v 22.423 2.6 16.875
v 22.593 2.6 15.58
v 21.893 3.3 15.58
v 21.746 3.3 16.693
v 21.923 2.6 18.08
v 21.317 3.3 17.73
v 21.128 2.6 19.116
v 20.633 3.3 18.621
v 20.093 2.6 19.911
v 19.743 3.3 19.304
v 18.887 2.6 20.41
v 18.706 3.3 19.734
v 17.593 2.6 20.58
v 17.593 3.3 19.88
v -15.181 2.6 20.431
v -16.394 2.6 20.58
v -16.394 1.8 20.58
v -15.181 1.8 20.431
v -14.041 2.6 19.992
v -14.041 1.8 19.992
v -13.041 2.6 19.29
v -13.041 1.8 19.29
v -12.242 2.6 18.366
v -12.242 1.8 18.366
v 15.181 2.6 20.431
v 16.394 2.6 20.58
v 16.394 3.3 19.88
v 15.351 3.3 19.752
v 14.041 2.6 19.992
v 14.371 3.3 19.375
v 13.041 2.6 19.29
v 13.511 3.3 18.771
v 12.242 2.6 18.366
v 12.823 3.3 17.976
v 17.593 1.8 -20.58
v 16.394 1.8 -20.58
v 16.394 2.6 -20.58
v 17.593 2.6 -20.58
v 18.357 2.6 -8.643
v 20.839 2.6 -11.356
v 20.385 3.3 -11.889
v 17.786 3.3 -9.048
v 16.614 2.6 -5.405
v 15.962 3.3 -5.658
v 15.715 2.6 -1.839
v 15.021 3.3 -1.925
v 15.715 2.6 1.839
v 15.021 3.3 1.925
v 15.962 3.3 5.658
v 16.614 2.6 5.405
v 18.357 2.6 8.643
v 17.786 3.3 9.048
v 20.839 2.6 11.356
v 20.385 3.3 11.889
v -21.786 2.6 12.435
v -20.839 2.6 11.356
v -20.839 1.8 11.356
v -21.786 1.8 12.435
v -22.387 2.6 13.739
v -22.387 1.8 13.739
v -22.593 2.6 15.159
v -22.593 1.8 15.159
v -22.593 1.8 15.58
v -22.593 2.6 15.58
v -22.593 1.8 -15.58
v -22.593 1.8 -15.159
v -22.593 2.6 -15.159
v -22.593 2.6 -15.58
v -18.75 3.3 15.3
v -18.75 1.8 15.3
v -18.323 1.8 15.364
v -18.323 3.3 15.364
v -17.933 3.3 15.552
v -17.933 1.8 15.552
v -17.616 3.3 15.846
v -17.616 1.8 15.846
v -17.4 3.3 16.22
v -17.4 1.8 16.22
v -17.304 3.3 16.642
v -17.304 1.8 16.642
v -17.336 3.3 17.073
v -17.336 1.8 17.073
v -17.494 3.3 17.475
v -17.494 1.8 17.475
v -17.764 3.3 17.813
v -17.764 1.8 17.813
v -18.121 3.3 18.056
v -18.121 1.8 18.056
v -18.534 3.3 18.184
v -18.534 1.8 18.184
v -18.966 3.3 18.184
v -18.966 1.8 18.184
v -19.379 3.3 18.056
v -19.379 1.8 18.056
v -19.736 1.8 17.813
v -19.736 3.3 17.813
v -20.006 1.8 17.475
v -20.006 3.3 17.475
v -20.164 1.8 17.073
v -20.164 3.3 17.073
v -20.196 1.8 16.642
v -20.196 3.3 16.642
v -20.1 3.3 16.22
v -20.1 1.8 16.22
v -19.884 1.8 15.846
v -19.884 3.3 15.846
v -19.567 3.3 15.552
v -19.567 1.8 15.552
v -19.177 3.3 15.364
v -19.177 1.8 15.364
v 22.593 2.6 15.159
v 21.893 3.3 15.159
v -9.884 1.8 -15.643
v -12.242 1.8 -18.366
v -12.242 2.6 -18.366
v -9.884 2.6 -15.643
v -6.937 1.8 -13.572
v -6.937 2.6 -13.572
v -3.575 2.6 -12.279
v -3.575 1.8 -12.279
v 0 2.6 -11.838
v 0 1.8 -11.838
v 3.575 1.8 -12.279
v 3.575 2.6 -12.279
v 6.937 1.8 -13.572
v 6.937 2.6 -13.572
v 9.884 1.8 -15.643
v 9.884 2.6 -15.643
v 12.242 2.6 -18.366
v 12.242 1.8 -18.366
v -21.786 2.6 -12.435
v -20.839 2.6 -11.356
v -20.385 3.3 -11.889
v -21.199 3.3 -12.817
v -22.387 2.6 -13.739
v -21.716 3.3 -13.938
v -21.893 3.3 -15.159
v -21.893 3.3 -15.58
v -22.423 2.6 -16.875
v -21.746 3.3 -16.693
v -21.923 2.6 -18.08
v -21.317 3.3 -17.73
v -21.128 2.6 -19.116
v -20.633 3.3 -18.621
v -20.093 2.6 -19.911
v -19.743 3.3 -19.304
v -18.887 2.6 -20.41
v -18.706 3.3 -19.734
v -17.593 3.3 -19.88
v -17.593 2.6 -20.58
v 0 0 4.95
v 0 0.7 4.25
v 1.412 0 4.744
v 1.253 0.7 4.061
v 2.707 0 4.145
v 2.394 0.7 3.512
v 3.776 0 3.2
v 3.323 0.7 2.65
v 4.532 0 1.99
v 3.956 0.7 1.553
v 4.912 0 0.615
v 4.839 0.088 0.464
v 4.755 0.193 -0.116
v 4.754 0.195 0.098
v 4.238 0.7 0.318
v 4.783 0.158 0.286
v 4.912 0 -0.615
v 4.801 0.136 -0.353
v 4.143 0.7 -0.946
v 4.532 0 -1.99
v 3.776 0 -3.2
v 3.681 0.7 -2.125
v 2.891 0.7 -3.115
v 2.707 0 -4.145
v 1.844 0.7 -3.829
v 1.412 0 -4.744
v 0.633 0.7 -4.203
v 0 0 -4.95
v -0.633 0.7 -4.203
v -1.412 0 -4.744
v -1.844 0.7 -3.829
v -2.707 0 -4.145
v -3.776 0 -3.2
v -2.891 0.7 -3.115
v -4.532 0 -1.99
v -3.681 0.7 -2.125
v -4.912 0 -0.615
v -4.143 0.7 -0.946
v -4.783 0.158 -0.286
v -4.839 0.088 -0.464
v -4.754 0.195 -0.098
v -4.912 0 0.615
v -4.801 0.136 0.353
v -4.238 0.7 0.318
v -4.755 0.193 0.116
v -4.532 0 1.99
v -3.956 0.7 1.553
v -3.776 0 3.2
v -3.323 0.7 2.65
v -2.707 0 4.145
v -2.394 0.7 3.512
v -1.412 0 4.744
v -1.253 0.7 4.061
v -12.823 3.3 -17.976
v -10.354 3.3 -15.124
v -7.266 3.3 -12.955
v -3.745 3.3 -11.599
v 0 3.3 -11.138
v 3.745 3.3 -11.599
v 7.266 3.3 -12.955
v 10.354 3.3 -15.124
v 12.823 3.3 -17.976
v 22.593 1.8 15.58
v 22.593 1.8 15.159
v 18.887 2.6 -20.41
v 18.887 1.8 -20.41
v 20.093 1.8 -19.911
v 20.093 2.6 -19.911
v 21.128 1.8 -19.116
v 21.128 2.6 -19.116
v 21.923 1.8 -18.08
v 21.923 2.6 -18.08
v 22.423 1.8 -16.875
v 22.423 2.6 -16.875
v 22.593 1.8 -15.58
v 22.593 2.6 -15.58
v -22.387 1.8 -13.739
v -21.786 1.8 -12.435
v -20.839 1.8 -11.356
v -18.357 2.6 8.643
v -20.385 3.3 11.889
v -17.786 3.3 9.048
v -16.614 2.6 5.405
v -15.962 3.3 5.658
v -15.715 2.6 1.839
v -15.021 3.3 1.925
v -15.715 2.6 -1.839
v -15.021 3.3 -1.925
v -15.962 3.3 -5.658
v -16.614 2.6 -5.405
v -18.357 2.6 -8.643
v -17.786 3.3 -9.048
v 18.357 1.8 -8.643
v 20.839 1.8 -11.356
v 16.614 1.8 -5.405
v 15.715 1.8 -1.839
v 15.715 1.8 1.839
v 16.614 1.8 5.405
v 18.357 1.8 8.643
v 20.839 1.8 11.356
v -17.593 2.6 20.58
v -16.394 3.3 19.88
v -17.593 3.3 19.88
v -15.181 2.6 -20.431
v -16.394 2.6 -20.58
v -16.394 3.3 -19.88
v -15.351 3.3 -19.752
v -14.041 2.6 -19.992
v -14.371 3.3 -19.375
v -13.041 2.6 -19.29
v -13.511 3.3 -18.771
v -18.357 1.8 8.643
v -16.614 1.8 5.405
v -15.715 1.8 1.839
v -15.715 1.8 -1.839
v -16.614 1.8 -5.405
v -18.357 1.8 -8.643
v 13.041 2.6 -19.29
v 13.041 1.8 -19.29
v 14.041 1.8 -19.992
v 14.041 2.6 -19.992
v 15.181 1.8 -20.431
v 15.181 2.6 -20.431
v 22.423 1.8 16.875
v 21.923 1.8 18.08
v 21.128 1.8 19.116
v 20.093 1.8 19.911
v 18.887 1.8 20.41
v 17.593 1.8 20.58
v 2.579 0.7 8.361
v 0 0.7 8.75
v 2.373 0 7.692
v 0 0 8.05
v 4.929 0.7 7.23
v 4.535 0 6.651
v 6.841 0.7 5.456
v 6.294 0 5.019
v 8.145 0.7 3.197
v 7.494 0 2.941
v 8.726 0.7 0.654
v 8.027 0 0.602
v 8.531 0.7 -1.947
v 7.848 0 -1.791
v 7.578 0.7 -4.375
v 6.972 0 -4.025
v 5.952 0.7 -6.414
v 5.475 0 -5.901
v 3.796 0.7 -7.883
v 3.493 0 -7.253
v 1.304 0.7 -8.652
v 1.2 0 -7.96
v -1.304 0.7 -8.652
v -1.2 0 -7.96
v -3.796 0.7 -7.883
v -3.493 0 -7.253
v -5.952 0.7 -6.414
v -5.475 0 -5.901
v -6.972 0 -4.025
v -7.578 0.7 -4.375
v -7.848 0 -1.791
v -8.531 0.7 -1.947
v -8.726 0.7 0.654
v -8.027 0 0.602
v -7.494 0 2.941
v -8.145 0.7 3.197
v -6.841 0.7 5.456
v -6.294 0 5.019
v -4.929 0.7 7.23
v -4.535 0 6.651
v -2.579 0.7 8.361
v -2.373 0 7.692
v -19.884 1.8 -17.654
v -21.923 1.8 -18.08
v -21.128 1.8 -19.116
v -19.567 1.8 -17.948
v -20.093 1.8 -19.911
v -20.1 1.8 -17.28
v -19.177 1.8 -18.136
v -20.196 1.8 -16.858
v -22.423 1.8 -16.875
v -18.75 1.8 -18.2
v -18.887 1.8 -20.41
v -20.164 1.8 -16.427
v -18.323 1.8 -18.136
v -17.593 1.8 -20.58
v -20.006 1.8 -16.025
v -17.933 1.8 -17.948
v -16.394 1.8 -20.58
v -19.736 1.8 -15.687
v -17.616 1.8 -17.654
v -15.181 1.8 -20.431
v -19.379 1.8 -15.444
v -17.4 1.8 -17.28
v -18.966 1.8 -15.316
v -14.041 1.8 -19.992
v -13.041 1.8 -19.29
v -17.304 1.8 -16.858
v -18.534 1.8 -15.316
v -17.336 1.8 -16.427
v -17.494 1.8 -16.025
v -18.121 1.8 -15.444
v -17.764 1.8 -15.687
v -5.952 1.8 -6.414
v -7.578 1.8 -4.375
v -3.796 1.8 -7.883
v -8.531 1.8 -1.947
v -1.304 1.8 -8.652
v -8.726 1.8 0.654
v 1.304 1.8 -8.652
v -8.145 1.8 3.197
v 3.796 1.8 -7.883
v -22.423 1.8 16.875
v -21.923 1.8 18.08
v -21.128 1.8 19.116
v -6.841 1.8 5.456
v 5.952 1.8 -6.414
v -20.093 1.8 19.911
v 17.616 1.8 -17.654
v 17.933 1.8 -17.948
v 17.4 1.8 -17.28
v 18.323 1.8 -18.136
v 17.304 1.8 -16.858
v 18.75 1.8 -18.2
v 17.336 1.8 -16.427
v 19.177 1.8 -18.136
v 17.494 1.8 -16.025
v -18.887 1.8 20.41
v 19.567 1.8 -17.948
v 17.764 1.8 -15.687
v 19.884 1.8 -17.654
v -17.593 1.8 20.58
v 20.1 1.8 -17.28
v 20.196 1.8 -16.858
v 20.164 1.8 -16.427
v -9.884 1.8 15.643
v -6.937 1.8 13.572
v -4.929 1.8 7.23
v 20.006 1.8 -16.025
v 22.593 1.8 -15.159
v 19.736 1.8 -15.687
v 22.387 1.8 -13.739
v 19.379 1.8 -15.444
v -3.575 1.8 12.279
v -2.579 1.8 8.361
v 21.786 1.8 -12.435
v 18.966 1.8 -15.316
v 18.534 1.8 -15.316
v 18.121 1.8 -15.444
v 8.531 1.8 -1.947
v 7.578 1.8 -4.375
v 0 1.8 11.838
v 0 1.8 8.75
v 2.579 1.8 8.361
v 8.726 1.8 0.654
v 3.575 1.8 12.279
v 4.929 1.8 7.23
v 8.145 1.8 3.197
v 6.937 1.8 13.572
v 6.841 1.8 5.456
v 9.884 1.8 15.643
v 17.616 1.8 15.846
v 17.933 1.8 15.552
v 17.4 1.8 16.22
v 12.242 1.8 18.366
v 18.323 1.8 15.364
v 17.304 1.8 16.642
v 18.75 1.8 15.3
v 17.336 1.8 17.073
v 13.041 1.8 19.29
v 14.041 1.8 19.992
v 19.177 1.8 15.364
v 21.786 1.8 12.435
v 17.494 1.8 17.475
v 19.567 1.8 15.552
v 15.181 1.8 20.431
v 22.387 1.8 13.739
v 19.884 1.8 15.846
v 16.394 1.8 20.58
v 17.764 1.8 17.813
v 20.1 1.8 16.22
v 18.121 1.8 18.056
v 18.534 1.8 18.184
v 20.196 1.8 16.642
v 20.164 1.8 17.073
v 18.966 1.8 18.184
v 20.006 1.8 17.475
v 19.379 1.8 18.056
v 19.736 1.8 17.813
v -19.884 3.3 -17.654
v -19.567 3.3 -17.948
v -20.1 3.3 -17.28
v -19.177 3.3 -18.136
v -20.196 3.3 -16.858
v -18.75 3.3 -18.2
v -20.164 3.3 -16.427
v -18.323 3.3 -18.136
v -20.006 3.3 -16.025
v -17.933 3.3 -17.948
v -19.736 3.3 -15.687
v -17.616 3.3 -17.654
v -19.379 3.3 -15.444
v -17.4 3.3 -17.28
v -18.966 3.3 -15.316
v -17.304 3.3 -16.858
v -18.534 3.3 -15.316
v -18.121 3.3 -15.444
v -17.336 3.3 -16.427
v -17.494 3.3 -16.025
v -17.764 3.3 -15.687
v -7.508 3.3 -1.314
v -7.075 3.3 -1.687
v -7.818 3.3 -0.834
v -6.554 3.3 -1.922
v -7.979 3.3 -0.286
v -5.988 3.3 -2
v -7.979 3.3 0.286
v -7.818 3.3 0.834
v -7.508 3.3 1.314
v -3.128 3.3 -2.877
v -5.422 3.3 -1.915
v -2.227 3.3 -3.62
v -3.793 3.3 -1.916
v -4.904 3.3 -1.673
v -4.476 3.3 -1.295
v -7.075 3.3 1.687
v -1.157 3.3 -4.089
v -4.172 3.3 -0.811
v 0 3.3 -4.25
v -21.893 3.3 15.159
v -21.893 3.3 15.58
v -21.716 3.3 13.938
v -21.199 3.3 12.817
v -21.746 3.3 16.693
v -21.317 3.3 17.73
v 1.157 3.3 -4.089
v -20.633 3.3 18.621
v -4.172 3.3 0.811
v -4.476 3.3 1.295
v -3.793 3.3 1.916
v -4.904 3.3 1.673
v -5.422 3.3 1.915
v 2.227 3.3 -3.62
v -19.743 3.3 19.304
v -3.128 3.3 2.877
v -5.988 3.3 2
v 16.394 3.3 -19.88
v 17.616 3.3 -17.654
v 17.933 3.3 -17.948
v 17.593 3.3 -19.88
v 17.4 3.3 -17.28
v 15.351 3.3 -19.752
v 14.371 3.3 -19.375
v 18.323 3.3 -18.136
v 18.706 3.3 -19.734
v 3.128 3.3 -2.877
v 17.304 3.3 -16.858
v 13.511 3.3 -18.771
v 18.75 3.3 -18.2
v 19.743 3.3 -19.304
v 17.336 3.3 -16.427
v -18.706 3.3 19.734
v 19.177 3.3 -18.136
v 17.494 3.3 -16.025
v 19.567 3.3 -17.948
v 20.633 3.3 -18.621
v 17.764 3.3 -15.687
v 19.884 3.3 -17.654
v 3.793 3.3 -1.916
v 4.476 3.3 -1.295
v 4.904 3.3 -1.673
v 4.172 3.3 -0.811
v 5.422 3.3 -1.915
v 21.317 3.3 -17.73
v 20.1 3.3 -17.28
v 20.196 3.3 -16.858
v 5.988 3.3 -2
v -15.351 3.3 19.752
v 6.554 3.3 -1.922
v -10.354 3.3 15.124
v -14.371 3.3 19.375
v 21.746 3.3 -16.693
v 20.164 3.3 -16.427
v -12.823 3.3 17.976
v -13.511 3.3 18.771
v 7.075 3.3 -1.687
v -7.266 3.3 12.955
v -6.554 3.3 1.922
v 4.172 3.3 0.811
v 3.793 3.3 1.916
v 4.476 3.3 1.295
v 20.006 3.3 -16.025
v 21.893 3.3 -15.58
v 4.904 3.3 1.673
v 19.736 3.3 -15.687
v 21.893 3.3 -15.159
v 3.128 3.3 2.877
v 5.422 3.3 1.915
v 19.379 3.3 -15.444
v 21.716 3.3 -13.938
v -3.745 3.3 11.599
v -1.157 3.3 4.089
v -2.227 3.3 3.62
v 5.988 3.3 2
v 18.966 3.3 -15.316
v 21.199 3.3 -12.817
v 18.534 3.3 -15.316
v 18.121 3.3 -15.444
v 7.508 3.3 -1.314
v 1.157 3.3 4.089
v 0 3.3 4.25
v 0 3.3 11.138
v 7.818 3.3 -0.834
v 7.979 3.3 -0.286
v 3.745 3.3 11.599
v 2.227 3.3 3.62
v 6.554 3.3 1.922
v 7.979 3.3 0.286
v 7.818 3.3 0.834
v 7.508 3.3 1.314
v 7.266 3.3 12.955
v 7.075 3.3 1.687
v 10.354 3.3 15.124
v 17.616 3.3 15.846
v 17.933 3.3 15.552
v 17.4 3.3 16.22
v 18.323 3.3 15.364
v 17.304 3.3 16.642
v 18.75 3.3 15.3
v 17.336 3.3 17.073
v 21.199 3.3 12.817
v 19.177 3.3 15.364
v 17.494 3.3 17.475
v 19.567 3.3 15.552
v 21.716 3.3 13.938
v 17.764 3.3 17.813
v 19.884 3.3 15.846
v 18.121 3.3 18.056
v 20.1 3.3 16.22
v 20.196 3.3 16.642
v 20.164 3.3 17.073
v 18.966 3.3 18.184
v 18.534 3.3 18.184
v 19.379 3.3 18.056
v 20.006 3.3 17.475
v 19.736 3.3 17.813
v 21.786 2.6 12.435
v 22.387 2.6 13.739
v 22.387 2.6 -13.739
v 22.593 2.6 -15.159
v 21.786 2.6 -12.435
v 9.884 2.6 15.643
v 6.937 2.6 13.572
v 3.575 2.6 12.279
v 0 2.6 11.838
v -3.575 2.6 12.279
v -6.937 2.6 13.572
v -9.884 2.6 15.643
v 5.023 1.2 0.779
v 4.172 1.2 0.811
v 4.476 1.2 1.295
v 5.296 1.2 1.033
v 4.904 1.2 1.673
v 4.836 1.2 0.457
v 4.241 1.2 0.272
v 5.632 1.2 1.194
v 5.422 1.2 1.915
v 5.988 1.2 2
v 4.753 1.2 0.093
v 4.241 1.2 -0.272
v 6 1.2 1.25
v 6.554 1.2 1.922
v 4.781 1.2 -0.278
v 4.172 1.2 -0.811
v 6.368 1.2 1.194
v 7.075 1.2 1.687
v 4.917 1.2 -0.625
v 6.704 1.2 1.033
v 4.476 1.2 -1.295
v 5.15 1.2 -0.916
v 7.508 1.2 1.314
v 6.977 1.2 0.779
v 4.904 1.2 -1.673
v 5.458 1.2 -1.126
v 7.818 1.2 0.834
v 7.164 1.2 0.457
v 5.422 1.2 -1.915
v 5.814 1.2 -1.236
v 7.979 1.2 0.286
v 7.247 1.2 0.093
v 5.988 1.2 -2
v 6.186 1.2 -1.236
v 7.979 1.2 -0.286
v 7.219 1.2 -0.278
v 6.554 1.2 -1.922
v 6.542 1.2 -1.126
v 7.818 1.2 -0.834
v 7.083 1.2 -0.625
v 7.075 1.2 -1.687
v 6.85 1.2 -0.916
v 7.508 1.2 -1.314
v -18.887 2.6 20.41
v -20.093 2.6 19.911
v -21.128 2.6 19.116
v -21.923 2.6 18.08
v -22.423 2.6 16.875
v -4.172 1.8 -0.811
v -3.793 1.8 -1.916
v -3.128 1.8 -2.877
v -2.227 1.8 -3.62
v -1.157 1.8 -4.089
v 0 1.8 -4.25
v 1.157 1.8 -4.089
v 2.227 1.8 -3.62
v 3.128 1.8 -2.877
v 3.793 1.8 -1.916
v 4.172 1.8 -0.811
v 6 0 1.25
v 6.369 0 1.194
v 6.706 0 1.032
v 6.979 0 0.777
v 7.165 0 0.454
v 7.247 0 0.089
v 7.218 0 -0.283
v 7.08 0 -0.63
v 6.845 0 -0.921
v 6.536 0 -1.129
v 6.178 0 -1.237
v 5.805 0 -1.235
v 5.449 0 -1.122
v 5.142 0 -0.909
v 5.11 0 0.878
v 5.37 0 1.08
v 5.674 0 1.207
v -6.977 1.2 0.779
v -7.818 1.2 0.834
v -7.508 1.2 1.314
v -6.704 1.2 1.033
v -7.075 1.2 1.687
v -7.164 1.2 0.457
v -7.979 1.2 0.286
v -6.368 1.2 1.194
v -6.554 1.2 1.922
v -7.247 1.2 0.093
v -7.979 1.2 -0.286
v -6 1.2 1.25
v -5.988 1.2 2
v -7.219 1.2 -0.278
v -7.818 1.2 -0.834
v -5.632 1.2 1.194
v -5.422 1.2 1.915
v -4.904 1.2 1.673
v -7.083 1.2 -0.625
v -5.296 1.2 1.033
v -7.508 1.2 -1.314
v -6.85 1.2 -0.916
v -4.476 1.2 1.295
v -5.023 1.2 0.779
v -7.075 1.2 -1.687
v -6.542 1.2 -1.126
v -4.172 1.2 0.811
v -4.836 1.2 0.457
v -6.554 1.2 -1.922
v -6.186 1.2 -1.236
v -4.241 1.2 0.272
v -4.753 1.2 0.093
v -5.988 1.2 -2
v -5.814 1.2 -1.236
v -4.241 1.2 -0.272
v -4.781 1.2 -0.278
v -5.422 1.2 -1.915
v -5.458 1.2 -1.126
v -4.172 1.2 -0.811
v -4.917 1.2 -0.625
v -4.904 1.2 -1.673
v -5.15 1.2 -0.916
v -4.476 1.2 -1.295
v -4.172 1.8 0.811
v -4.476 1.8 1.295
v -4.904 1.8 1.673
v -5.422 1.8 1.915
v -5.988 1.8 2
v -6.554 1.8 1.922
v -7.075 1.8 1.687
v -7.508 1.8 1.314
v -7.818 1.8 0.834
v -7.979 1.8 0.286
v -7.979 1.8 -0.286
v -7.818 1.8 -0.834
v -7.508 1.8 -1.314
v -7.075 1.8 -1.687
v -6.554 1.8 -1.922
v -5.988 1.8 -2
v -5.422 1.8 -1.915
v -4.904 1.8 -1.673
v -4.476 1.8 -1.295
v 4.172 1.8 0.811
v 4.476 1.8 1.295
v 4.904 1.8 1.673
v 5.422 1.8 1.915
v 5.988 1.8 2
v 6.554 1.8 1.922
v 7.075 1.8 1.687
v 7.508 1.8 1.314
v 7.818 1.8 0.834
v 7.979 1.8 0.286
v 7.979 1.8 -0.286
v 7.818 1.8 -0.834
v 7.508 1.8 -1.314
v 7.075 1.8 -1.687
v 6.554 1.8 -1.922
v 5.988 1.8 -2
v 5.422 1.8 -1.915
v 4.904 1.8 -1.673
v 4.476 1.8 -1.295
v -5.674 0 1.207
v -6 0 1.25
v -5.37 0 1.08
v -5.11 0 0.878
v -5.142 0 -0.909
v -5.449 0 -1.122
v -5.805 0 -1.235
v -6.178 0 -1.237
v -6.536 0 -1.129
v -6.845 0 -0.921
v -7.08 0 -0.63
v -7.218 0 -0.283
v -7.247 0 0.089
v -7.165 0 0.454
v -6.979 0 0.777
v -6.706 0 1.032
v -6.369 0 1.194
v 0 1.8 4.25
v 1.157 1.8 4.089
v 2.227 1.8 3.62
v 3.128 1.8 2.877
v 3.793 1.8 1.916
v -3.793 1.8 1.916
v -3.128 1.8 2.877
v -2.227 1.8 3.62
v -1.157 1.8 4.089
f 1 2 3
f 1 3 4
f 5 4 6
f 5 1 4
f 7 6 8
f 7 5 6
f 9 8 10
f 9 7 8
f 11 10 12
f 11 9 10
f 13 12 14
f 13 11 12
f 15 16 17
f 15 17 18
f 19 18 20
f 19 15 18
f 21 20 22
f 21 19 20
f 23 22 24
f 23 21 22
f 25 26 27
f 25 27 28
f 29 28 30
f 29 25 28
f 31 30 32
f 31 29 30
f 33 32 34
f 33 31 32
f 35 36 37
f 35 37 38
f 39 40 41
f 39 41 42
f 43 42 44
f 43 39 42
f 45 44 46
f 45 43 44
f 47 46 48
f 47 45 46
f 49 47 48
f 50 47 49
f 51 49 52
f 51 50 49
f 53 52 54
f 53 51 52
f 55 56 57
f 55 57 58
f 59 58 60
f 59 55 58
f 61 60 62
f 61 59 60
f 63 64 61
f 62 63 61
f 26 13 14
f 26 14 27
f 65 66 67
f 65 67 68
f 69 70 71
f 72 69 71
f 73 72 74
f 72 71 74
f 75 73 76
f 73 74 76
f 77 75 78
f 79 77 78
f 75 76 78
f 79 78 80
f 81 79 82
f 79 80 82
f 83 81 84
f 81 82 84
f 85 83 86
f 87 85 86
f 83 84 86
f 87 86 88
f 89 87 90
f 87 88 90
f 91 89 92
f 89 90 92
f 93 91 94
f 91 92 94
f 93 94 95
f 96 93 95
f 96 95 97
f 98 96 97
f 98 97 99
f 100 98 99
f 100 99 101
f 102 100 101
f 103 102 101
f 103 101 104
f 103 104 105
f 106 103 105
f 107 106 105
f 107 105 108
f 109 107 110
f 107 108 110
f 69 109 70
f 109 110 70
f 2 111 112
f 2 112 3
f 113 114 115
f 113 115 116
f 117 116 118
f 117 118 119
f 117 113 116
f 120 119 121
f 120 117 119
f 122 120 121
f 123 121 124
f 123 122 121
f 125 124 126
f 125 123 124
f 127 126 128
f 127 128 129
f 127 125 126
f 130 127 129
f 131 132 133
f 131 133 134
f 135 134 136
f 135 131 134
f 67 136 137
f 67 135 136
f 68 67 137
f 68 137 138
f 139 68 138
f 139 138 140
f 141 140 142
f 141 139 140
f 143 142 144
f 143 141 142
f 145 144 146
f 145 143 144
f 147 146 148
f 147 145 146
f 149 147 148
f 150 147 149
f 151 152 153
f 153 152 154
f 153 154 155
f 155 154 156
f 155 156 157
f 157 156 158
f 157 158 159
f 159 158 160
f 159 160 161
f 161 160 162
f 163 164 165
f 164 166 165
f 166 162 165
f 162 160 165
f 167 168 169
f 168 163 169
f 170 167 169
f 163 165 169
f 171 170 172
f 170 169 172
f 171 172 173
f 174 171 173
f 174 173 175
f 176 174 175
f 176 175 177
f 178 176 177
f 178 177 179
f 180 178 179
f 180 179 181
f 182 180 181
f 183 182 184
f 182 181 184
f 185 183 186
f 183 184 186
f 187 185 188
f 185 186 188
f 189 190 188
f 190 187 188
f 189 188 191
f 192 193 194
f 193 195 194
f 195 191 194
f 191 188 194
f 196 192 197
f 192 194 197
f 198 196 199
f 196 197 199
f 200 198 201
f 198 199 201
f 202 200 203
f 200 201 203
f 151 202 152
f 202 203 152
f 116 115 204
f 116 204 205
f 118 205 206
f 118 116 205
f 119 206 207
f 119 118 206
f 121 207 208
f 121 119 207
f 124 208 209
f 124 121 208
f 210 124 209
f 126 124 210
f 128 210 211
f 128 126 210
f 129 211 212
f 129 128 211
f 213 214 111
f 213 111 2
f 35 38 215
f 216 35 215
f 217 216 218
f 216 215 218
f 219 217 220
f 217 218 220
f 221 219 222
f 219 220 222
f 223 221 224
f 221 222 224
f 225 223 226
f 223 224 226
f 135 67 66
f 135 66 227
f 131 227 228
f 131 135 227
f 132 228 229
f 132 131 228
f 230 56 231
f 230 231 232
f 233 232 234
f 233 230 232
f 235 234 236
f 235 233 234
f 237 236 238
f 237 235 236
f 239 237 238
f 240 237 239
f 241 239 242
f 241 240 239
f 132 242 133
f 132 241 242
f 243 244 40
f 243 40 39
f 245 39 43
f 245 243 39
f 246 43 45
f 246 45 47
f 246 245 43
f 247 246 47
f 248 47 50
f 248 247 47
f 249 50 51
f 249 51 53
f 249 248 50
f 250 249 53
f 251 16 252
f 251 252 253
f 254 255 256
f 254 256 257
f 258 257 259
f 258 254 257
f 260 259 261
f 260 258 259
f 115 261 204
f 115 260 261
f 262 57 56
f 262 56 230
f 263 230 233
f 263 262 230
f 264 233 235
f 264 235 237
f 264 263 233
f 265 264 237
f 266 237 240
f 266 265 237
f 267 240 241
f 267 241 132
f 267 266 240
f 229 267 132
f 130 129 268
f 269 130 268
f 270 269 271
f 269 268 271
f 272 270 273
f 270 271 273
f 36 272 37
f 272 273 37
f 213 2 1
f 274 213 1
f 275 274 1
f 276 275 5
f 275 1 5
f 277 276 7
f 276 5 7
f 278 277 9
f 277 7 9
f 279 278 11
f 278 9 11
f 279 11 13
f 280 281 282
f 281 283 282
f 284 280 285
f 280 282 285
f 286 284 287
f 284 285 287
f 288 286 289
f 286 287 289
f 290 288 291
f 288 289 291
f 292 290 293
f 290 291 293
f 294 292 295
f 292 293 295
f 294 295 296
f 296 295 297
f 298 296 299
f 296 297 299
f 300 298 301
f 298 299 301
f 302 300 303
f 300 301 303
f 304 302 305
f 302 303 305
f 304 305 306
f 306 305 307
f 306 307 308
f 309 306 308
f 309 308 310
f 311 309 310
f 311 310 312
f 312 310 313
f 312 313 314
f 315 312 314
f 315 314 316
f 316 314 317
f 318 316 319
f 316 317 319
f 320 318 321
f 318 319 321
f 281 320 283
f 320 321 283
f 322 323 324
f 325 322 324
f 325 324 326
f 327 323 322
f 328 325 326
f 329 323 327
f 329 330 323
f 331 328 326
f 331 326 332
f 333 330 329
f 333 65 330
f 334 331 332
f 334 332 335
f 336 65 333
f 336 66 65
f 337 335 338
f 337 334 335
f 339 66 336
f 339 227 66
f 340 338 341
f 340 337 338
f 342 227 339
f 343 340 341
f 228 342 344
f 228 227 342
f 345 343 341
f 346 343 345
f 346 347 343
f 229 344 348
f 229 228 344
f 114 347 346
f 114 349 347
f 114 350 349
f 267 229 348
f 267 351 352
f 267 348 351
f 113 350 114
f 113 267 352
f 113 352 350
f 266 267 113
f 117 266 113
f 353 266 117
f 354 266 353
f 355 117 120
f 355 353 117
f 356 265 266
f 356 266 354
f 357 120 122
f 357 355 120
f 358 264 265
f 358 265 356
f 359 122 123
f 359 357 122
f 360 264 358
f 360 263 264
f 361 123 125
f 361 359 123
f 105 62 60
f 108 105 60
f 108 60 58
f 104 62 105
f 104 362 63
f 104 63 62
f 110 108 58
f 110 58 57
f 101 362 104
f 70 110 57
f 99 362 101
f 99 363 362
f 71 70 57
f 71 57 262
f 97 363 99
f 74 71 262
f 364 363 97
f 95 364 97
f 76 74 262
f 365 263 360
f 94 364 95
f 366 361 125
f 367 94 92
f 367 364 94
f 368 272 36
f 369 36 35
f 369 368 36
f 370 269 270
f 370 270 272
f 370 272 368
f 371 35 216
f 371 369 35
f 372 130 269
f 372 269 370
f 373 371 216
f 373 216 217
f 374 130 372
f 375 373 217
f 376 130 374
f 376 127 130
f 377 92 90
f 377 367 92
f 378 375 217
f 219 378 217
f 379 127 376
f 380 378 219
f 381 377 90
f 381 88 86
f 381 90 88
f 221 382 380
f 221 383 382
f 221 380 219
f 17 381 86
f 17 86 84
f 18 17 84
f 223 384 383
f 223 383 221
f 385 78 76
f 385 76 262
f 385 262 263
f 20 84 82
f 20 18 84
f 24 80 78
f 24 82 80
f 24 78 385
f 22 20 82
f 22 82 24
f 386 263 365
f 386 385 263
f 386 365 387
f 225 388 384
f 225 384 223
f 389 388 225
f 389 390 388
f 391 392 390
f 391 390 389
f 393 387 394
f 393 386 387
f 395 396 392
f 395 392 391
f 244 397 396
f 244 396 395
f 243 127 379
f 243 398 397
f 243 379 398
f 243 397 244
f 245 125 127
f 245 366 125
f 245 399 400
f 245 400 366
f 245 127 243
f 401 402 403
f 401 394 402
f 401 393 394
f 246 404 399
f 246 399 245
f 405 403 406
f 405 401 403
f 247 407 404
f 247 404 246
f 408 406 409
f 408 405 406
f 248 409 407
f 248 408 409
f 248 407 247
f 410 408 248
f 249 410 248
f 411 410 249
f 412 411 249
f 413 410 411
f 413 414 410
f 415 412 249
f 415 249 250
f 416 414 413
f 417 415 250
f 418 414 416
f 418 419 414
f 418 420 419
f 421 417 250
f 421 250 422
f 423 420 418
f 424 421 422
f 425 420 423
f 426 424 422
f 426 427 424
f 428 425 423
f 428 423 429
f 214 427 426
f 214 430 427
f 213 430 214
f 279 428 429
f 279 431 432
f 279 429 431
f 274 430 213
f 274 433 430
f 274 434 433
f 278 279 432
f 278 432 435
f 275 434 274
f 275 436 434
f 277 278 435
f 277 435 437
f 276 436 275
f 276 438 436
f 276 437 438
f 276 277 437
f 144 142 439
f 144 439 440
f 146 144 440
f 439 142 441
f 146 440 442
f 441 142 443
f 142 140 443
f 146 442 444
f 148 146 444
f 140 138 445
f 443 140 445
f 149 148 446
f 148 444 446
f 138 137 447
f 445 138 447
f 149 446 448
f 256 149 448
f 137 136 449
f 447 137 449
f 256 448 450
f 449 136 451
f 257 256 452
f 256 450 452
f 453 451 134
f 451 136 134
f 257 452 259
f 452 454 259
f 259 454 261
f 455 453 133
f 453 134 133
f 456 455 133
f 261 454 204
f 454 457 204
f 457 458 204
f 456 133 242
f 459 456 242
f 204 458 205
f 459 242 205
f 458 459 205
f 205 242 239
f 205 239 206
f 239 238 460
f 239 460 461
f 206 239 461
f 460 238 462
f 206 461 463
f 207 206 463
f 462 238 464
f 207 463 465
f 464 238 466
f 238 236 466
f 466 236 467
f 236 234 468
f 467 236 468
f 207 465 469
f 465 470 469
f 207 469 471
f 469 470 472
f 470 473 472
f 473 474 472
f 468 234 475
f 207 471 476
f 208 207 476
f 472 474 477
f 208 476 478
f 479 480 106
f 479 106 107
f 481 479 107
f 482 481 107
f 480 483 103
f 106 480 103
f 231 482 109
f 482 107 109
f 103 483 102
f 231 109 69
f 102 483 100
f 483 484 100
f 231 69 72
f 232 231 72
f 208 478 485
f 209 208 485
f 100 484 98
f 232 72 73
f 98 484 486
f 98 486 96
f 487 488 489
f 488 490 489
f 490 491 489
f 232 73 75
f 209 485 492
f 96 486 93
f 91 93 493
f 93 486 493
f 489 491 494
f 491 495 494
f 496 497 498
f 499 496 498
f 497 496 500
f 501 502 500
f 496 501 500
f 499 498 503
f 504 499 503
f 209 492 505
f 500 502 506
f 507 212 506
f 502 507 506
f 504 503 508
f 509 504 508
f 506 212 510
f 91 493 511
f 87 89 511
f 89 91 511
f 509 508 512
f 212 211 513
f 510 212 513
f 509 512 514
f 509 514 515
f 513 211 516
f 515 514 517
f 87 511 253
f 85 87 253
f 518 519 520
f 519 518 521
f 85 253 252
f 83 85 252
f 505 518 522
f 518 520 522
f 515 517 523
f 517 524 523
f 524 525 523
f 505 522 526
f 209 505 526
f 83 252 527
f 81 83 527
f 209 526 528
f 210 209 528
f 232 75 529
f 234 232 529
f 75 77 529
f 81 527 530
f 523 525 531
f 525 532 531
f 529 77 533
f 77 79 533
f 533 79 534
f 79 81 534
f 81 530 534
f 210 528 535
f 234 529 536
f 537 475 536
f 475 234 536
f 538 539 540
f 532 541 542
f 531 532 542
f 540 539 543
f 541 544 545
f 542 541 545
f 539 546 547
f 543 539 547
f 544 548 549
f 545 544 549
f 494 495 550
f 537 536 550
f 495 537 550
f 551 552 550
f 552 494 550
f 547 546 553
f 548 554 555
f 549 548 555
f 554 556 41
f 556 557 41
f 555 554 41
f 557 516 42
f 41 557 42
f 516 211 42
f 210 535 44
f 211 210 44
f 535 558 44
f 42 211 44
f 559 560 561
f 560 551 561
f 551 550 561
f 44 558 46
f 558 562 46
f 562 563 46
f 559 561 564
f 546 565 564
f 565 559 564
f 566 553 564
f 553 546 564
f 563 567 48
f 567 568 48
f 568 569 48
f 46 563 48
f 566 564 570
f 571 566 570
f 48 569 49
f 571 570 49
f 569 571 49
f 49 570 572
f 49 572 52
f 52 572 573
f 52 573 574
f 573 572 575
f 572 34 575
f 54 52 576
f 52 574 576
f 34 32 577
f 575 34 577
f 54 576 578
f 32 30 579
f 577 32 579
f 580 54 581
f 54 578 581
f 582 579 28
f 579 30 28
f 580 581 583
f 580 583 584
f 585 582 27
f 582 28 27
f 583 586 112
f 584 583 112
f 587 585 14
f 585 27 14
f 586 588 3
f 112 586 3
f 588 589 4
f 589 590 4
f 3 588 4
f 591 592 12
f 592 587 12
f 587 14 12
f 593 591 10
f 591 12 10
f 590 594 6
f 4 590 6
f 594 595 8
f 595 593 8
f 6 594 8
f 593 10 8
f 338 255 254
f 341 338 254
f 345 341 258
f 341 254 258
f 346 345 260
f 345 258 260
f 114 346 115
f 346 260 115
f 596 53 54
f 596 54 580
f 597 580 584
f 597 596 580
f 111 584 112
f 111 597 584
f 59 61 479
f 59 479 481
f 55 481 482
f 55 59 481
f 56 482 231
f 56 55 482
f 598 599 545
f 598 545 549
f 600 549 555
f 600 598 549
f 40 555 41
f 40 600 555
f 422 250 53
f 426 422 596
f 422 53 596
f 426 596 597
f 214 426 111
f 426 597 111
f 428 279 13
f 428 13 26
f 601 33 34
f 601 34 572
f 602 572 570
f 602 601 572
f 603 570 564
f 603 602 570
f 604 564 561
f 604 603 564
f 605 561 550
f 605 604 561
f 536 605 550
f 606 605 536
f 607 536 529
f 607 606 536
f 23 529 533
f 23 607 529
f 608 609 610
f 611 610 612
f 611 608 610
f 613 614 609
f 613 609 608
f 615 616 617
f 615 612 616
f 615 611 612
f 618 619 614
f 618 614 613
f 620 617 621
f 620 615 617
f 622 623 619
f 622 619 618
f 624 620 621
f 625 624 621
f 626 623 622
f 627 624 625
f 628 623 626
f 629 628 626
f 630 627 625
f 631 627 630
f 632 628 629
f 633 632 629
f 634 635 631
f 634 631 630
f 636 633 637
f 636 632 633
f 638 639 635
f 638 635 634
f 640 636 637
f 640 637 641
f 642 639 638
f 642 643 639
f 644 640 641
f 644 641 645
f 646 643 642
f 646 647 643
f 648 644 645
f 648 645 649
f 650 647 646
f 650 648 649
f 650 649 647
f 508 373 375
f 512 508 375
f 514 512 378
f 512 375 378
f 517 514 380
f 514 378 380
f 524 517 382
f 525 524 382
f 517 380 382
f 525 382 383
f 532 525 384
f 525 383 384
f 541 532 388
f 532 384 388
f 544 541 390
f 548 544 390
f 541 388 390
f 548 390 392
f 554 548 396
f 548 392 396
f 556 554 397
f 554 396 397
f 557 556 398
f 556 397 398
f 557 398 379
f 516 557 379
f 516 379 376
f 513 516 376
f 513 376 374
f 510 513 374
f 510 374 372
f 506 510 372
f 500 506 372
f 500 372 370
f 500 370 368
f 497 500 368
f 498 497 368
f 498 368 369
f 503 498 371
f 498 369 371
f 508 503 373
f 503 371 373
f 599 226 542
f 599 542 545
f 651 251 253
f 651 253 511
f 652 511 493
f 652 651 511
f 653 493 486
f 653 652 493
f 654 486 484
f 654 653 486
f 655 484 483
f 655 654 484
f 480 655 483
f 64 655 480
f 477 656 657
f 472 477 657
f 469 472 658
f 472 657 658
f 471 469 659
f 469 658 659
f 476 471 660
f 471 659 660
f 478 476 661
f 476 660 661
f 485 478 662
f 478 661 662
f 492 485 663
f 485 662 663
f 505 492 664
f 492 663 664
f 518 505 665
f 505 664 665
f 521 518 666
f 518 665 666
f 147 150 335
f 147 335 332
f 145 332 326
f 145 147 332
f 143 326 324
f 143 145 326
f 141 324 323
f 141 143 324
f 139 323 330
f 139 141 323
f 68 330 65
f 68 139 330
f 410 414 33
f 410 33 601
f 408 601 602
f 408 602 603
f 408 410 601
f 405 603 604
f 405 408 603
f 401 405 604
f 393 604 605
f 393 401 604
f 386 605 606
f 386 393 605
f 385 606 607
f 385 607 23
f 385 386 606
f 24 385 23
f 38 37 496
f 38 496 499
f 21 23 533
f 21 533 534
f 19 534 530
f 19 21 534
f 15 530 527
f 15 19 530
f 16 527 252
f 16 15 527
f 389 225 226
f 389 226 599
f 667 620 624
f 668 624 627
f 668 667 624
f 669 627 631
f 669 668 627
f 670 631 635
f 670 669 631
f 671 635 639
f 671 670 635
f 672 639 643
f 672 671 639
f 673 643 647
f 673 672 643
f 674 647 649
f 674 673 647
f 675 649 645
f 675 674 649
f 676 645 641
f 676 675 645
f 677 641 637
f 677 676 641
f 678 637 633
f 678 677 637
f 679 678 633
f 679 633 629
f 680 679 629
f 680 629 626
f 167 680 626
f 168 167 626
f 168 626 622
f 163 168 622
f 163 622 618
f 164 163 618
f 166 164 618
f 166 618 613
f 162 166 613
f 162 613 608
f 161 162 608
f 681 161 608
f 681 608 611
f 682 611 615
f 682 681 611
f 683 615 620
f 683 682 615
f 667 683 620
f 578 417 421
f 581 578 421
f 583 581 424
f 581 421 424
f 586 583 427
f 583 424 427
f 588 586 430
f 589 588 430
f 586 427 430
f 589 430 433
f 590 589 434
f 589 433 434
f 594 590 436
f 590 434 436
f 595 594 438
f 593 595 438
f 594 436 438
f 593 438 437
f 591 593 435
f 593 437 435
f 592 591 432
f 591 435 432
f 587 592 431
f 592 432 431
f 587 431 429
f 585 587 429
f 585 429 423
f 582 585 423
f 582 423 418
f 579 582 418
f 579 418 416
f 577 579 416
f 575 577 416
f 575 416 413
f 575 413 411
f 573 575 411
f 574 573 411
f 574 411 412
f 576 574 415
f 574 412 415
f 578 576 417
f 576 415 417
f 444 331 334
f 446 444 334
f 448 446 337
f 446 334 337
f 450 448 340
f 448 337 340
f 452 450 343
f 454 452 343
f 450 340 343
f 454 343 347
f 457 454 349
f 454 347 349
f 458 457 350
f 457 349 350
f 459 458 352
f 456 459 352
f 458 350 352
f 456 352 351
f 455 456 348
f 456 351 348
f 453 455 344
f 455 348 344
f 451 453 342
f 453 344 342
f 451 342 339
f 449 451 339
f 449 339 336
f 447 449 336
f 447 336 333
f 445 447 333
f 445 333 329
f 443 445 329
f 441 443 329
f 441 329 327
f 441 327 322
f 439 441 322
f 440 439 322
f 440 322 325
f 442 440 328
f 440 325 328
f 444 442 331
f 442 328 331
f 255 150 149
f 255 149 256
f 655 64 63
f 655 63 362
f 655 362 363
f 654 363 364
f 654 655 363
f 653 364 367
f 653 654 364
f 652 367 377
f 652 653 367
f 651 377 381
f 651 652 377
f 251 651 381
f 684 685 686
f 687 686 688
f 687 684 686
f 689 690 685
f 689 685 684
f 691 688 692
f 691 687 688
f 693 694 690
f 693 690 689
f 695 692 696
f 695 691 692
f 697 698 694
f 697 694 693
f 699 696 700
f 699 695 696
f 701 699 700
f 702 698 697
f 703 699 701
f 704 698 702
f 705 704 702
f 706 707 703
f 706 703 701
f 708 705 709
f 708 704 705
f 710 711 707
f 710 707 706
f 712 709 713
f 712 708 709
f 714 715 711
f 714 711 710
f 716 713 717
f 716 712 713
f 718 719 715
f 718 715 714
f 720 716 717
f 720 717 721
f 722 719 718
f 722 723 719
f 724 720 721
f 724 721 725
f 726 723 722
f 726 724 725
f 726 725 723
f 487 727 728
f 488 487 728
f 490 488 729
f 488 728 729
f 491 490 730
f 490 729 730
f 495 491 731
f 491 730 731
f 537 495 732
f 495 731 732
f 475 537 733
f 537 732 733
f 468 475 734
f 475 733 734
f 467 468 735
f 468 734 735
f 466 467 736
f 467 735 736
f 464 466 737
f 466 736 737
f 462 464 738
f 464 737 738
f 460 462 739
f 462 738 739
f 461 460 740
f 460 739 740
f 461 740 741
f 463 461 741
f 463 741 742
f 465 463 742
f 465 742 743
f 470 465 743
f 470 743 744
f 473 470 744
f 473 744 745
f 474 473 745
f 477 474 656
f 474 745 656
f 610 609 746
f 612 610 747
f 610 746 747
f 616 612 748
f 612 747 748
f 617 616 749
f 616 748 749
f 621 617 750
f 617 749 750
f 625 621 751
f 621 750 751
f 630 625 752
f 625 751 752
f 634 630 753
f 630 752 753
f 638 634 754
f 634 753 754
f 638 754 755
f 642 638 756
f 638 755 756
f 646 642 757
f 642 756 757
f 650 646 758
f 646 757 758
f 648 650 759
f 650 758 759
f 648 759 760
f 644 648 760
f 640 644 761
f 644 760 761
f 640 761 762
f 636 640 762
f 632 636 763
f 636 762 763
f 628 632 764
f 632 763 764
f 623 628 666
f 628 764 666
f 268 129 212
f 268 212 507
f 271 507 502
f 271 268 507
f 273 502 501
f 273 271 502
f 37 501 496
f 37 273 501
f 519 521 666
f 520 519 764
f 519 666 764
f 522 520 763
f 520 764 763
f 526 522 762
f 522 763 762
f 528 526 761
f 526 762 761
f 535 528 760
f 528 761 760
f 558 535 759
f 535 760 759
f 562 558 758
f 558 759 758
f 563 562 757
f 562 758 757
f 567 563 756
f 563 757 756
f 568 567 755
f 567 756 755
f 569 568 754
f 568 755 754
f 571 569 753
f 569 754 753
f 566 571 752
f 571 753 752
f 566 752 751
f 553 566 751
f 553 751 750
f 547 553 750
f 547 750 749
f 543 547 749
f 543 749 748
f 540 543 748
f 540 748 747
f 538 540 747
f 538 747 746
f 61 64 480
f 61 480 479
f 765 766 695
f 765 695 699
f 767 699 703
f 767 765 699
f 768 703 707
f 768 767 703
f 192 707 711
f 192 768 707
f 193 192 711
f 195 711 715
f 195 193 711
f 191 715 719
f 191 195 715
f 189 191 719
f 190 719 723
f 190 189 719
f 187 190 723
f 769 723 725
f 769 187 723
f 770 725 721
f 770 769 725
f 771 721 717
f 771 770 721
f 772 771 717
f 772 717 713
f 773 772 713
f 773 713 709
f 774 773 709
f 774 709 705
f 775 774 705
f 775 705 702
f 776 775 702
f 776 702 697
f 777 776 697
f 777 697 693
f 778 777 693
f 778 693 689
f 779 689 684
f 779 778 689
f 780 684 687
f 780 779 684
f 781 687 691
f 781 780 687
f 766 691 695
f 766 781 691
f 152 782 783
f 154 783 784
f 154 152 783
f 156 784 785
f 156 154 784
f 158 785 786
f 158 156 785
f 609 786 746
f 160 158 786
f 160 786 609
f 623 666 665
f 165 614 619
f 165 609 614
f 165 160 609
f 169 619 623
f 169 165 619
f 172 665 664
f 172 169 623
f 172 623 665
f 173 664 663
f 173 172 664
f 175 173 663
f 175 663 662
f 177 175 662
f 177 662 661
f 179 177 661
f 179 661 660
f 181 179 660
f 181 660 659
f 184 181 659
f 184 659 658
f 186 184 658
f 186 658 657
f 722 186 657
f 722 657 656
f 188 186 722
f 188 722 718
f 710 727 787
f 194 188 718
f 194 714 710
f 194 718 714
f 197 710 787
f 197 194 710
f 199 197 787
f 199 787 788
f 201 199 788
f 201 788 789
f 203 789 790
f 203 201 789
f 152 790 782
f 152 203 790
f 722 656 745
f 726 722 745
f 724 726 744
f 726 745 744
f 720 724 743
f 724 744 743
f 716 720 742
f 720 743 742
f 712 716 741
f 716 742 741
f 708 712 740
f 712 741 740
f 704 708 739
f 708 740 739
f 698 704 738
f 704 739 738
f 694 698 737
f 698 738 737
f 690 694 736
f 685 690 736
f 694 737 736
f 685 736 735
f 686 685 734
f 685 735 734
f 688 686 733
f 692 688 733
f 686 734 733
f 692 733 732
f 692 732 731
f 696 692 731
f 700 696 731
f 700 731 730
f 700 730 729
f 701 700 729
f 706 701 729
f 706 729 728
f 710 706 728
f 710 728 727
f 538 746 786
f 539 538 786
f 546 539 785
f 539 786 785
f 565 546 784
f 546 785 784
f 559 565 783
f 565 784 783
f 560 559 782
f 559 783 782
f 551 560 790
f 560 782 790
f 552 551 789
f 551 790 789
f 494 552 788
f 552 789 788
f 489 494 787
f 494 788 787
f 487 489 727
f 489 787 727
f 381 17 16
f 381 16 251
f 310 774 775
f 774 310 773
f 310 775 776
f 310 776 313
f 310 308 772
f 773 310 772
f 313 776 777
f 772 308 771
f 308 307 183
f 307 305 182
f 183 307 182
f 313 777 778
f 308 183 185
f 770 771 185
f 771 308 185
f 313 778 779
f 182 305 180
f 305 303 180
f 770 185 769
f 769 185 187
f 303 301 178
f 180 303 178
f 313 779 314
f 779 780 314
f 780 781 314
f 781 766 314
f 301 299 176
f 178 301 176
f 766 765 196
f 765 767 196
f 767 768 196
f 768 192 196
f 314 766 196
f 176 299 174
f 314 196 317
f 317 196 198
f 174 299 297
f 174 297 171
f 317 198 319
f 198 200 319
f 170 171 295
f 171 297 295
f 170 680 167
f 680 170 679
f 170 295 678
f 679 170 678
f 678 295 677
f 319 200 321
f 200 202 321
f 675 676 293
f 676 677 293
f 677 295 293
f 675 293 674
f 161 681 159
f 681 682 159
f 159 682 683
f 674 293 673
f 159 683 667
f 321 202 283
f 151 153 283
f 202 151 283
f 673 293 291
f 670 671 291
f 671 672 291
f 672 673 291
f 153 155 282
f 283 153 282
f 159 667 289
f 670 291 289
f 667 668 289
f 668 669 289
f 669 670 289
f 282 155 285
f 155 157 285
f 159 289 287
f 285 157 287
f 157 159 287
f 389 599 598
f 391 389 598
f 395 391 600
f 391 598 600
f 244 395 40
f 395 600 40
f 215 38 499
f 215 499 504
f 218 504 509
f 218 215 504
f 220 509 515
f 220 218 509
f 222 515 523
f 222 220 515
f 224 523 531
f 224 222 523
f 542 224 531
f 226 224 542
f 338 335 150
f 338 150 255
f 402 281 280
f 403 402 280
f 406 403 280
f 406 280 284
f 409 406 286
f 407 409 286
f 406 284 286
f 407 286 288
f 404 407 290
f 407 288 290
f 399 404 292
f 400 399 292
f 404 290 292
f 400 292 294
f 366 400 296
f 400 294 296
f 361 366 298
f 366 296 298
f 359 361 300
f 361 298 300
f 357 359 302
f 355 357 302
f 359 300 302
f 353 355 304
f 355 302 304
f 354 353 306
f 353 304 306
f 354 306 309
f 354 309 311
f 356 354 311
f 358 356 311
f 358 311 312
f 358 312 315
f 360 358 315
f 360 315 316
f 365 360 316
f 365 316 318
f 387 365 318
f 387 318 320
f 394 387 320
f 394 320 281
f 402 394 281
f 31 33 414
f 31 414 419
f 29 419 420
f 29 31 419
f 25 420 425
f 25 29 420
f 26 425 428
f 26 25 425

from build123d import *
from build123d.topology import SkipClean

# Parameters (mm, degrees)
SKETCH1_R           = 8.75
SKETCH1_R_2         = 4.25
SKETCH1_R_3         = 1.25
BOSS_EXTRUDE1_DEPTH = 1.8
SKETCH2_R           = 2
CUT_EXTRUDE1_DEPTH  = 0.6
SKETCH3_R           = 1.45
BOSS_EXTRUDE2_DEPTH = 1.5
FILLET1_R           = 5
CHAMFER1_SIZE       = 0.7
CHAMFER2_SIZE       = 0.7


with BuildPart() as part:
    # Sketch1 → Boss-Extrude1 (new body)
    with BuildSketch(Plane(origin=(0, 0, 0), x_dir=(1, 0, 0), z_dir=(0, 1, 0))):
        with Locations(Location((0, 0, 0), (0, 0, 270))):
            Circle(SKETCH1_R)
        with Locations(Location((0, 0, 0), (0, 0, 270))):
            Circle(SKETCH1_R_2, mode=Mode.SUBTRACT)
        with Locations(Location((-6, 0, 0), (0, 0, 270))):
            Circle(SKETCH1_R_3, mode=Mode.SUBTRACT)
        with Locations(Location((6, 0, 0), (0, 0, 270))):
            Circle(SKETCH1_R_3, mode=Mode.SUBTRACT)
    extrude(amount=BOSS_EXTRUDE1_DEPTH)

    # Sketch2 → Cut-Extrude1 (cut)
    with BuildSketch(Plane(origin=(0, 1.8, 0), x_dir=(1, 0, 0), z_dir=(0, 1, 0))):
        with Locations((-6, 0)):
            Circle(SKETCH2_R)
        with Locations((6, 0)):
            Circle(SKETCH2_R)
    extrude(amount=-CUT_EXTRUDE1_DEPTH, mode=Mode.SUBTRACT)

    # Sketch3 → Boss-Extrude2 (add)
    with SkipClean():  # the faces are left unmerged after this step: merging them gives an invalid solid
        with BuildSketch(Plane.XZ.offset(-1.8)):
            with BuildLine():
                Line((-22.592922776, -20.580461491), (-13.466151705, -20.580461491))
                ThreePointArc((-13.466151705, -20.580461491), (0, -11.838443279), (13.466151705, -20.580461491))
                Line((13.466151705, -20.580461491), (22.592922776, -20.580461491))
                Line((22.592922776, -20.580461491), (22.592922776, -12.644988276))
                ThreePointArc((22.592922776, -12.644988276), (15.601572689, 0), (22.592922776, 12.644988276))
                Line((22.592922776, 12.644988276), (22.592922776, 20.580461491))
                Line((22.592922776, 20.580461491), (13.466151705, 20.580461491))
                ThreePointArc((13.466151705, 20.580461491), (0, 11.838443279), (-13.466151705, 20.580461491))
                Line((-13.466151705, 20.580461491), (-22.592922776, 20.580461491))
                Line((-22.592922776, 20.580461491), (-22.592922776, 12.644988276))
                ThreePointArc((-22.592922776, 12.644988276), (-15.601572689, 0), (-22.592922776, -12.644988276))
                Line((-22.592922776, -12.644988276), (-22.592922776, -20.580461491))
            make_face()
            with Locations(Location((18.75, 16.75, 0), (0, 0, 270))):
                Circle(SKETCH3_R, mode=Mode.SUBTRACT)
            with Locations(Location((18.75, -16.75, 0), (0, 0, 270))):
                Circle(SKETCH3_R, mode=Mode.SUBTRACT)
            with Locations(Location((-18.75, -16.75, 0), (0, 0, 270))):
                Circle(SKETCH3_R, mode=Mode.SUBTRACT)
            with Locations(Location((-18.75, 16.75, 0), (0, 0, 270))):
                Circle(SKETCH3_R, mode=Mode.SUBTRACT)
            with BuildLine():
                ThreePointArc((-4.171875, -0.81114671), (0, -4.25), (4.171875, -0.81114671))
                ThreePointArc((4.171875, -0.81114671), (8, 0), (4.171875, 0.81114671))
                ThreePointArc((4.171875, 0.81114671), (0, 4.25), (-4.171875, 0.81114671))
                ThreePointArc((-4.171875, 0.81114671), (-8, 0), (-4.171875, -0.81114671))
            make_face(mode=Mode.SUBTRACT)
        extrude(amount=-BOSS_EXTRUDE2_DEPTH)

    # Fillet1
    fillet1_edges = [part.edges().sort_by_distance(p)[0] for p in [
        (13.466151705, 2.55, 20.580461491),
        (22.592922776, 2.55, 20.580461491),
        (22.592922776, 2.55, 12.644988276),
        (22.592922776, 2.55, -12.644988276),
        (22.592922776, 2.55, -20.580461491),
        (13.466151705, 2.55, -20.580461491),
        (-13.466151705, 2.55, -20.580461491),
        (-22.592922776, 2.55, -20.580461491),
        (-22.592922776, 2.55, -12.644988276),
        (-22.592922776, 2.55, 12.644988276),
        (-22.592922776, 2.55, 20.580461491),
        (-13.466151705, 2.55, 20.580461491),
    ]]
    fillet(fillet1_edges, radius=FILLET1_R)

    # Chamfer1
    # the kernel refuses this chamfer: 0.7 mm, written as the material it takes off along each edge
    with BuildSketch(Plane(origin=(0, 0, 0), x_dir=(0, 0, 1), z_dir=(-1, 0, 0))) as chamfer1_piece_1:
        Polygon((8.75, CHAMFER1_SIZE), (8.75 - CHAMFER1_SIZE, 0), (8.75, 0), align=None)
    revolve(axis=Axis((0, 0, 0), (0, 1, 0)), mode=Mode.SUBTRACT)
    with BuildSketch(Plane(origin=(0, 0, 0), x_dir=(0, 0, 1), z_dir=(-1, 0, 0))) as chamfer1_piece_2:
        Polygon((4.25 + CHAMFER1_SIZE, 0), (4.25, CHAMFER1_SIZE), (4.25, 0), align=None)
    revolve(axis=Axis((0, 0, 0), (0, 1, 0)), mode=Mode.SUBTRACT)

    # Chamfer2
    chamfer2_edges = [part.edges().sort_by_distance(p)[0] for p in [
        (15.601572689, 3.3, 0),
        (16.993372755, 3.3, 20.580461491),
        (22.592922776, 3.3, 15.369960777),
        (16.993372755, 3.3, -20.580461491),
        (0, 3.3, -11.838443279),
        (-16.993372755, 3.3, -20.580461491),
        (-22.592922776, 3.3, -15.369960777),
        (-15.601572689, 3.3, 0),
        (-22.592922776, 3.3, 15.369960777),
        (-16.993372755, 3.3, 20.580461491),
        (0, 3.3, 11.838443279),
        (14.041165239, 3.3, 19.992377481),
        (21.128456682, 3.3, 19.115995397),
        (22.133326206, 3.3, 13.065483774),
        (-21.128456682, 3.3, 19.115995397),
        (-14.041165239, 3.3, 19.992377481),
        (-22.133326206, 3.3, 13.065483774),
        (-22.133326206, 3.3, -13.065483774),
        (14.041165239, 3.3, -19.992377481),
        (-21.128456682, 3.3, -19.115995397),
        (-14.041165239, 3.3, -19.992377481),
        (21.128456682, 3.3, -19.115995397),
        (22.133326206, 3.3, -13.065483774),
        (22.592922776, 3.3, -15.369960777),
    ]]
    chamfer(chamfer2_edges, length=CHAMFER2_SIZE)


solid = part.part
